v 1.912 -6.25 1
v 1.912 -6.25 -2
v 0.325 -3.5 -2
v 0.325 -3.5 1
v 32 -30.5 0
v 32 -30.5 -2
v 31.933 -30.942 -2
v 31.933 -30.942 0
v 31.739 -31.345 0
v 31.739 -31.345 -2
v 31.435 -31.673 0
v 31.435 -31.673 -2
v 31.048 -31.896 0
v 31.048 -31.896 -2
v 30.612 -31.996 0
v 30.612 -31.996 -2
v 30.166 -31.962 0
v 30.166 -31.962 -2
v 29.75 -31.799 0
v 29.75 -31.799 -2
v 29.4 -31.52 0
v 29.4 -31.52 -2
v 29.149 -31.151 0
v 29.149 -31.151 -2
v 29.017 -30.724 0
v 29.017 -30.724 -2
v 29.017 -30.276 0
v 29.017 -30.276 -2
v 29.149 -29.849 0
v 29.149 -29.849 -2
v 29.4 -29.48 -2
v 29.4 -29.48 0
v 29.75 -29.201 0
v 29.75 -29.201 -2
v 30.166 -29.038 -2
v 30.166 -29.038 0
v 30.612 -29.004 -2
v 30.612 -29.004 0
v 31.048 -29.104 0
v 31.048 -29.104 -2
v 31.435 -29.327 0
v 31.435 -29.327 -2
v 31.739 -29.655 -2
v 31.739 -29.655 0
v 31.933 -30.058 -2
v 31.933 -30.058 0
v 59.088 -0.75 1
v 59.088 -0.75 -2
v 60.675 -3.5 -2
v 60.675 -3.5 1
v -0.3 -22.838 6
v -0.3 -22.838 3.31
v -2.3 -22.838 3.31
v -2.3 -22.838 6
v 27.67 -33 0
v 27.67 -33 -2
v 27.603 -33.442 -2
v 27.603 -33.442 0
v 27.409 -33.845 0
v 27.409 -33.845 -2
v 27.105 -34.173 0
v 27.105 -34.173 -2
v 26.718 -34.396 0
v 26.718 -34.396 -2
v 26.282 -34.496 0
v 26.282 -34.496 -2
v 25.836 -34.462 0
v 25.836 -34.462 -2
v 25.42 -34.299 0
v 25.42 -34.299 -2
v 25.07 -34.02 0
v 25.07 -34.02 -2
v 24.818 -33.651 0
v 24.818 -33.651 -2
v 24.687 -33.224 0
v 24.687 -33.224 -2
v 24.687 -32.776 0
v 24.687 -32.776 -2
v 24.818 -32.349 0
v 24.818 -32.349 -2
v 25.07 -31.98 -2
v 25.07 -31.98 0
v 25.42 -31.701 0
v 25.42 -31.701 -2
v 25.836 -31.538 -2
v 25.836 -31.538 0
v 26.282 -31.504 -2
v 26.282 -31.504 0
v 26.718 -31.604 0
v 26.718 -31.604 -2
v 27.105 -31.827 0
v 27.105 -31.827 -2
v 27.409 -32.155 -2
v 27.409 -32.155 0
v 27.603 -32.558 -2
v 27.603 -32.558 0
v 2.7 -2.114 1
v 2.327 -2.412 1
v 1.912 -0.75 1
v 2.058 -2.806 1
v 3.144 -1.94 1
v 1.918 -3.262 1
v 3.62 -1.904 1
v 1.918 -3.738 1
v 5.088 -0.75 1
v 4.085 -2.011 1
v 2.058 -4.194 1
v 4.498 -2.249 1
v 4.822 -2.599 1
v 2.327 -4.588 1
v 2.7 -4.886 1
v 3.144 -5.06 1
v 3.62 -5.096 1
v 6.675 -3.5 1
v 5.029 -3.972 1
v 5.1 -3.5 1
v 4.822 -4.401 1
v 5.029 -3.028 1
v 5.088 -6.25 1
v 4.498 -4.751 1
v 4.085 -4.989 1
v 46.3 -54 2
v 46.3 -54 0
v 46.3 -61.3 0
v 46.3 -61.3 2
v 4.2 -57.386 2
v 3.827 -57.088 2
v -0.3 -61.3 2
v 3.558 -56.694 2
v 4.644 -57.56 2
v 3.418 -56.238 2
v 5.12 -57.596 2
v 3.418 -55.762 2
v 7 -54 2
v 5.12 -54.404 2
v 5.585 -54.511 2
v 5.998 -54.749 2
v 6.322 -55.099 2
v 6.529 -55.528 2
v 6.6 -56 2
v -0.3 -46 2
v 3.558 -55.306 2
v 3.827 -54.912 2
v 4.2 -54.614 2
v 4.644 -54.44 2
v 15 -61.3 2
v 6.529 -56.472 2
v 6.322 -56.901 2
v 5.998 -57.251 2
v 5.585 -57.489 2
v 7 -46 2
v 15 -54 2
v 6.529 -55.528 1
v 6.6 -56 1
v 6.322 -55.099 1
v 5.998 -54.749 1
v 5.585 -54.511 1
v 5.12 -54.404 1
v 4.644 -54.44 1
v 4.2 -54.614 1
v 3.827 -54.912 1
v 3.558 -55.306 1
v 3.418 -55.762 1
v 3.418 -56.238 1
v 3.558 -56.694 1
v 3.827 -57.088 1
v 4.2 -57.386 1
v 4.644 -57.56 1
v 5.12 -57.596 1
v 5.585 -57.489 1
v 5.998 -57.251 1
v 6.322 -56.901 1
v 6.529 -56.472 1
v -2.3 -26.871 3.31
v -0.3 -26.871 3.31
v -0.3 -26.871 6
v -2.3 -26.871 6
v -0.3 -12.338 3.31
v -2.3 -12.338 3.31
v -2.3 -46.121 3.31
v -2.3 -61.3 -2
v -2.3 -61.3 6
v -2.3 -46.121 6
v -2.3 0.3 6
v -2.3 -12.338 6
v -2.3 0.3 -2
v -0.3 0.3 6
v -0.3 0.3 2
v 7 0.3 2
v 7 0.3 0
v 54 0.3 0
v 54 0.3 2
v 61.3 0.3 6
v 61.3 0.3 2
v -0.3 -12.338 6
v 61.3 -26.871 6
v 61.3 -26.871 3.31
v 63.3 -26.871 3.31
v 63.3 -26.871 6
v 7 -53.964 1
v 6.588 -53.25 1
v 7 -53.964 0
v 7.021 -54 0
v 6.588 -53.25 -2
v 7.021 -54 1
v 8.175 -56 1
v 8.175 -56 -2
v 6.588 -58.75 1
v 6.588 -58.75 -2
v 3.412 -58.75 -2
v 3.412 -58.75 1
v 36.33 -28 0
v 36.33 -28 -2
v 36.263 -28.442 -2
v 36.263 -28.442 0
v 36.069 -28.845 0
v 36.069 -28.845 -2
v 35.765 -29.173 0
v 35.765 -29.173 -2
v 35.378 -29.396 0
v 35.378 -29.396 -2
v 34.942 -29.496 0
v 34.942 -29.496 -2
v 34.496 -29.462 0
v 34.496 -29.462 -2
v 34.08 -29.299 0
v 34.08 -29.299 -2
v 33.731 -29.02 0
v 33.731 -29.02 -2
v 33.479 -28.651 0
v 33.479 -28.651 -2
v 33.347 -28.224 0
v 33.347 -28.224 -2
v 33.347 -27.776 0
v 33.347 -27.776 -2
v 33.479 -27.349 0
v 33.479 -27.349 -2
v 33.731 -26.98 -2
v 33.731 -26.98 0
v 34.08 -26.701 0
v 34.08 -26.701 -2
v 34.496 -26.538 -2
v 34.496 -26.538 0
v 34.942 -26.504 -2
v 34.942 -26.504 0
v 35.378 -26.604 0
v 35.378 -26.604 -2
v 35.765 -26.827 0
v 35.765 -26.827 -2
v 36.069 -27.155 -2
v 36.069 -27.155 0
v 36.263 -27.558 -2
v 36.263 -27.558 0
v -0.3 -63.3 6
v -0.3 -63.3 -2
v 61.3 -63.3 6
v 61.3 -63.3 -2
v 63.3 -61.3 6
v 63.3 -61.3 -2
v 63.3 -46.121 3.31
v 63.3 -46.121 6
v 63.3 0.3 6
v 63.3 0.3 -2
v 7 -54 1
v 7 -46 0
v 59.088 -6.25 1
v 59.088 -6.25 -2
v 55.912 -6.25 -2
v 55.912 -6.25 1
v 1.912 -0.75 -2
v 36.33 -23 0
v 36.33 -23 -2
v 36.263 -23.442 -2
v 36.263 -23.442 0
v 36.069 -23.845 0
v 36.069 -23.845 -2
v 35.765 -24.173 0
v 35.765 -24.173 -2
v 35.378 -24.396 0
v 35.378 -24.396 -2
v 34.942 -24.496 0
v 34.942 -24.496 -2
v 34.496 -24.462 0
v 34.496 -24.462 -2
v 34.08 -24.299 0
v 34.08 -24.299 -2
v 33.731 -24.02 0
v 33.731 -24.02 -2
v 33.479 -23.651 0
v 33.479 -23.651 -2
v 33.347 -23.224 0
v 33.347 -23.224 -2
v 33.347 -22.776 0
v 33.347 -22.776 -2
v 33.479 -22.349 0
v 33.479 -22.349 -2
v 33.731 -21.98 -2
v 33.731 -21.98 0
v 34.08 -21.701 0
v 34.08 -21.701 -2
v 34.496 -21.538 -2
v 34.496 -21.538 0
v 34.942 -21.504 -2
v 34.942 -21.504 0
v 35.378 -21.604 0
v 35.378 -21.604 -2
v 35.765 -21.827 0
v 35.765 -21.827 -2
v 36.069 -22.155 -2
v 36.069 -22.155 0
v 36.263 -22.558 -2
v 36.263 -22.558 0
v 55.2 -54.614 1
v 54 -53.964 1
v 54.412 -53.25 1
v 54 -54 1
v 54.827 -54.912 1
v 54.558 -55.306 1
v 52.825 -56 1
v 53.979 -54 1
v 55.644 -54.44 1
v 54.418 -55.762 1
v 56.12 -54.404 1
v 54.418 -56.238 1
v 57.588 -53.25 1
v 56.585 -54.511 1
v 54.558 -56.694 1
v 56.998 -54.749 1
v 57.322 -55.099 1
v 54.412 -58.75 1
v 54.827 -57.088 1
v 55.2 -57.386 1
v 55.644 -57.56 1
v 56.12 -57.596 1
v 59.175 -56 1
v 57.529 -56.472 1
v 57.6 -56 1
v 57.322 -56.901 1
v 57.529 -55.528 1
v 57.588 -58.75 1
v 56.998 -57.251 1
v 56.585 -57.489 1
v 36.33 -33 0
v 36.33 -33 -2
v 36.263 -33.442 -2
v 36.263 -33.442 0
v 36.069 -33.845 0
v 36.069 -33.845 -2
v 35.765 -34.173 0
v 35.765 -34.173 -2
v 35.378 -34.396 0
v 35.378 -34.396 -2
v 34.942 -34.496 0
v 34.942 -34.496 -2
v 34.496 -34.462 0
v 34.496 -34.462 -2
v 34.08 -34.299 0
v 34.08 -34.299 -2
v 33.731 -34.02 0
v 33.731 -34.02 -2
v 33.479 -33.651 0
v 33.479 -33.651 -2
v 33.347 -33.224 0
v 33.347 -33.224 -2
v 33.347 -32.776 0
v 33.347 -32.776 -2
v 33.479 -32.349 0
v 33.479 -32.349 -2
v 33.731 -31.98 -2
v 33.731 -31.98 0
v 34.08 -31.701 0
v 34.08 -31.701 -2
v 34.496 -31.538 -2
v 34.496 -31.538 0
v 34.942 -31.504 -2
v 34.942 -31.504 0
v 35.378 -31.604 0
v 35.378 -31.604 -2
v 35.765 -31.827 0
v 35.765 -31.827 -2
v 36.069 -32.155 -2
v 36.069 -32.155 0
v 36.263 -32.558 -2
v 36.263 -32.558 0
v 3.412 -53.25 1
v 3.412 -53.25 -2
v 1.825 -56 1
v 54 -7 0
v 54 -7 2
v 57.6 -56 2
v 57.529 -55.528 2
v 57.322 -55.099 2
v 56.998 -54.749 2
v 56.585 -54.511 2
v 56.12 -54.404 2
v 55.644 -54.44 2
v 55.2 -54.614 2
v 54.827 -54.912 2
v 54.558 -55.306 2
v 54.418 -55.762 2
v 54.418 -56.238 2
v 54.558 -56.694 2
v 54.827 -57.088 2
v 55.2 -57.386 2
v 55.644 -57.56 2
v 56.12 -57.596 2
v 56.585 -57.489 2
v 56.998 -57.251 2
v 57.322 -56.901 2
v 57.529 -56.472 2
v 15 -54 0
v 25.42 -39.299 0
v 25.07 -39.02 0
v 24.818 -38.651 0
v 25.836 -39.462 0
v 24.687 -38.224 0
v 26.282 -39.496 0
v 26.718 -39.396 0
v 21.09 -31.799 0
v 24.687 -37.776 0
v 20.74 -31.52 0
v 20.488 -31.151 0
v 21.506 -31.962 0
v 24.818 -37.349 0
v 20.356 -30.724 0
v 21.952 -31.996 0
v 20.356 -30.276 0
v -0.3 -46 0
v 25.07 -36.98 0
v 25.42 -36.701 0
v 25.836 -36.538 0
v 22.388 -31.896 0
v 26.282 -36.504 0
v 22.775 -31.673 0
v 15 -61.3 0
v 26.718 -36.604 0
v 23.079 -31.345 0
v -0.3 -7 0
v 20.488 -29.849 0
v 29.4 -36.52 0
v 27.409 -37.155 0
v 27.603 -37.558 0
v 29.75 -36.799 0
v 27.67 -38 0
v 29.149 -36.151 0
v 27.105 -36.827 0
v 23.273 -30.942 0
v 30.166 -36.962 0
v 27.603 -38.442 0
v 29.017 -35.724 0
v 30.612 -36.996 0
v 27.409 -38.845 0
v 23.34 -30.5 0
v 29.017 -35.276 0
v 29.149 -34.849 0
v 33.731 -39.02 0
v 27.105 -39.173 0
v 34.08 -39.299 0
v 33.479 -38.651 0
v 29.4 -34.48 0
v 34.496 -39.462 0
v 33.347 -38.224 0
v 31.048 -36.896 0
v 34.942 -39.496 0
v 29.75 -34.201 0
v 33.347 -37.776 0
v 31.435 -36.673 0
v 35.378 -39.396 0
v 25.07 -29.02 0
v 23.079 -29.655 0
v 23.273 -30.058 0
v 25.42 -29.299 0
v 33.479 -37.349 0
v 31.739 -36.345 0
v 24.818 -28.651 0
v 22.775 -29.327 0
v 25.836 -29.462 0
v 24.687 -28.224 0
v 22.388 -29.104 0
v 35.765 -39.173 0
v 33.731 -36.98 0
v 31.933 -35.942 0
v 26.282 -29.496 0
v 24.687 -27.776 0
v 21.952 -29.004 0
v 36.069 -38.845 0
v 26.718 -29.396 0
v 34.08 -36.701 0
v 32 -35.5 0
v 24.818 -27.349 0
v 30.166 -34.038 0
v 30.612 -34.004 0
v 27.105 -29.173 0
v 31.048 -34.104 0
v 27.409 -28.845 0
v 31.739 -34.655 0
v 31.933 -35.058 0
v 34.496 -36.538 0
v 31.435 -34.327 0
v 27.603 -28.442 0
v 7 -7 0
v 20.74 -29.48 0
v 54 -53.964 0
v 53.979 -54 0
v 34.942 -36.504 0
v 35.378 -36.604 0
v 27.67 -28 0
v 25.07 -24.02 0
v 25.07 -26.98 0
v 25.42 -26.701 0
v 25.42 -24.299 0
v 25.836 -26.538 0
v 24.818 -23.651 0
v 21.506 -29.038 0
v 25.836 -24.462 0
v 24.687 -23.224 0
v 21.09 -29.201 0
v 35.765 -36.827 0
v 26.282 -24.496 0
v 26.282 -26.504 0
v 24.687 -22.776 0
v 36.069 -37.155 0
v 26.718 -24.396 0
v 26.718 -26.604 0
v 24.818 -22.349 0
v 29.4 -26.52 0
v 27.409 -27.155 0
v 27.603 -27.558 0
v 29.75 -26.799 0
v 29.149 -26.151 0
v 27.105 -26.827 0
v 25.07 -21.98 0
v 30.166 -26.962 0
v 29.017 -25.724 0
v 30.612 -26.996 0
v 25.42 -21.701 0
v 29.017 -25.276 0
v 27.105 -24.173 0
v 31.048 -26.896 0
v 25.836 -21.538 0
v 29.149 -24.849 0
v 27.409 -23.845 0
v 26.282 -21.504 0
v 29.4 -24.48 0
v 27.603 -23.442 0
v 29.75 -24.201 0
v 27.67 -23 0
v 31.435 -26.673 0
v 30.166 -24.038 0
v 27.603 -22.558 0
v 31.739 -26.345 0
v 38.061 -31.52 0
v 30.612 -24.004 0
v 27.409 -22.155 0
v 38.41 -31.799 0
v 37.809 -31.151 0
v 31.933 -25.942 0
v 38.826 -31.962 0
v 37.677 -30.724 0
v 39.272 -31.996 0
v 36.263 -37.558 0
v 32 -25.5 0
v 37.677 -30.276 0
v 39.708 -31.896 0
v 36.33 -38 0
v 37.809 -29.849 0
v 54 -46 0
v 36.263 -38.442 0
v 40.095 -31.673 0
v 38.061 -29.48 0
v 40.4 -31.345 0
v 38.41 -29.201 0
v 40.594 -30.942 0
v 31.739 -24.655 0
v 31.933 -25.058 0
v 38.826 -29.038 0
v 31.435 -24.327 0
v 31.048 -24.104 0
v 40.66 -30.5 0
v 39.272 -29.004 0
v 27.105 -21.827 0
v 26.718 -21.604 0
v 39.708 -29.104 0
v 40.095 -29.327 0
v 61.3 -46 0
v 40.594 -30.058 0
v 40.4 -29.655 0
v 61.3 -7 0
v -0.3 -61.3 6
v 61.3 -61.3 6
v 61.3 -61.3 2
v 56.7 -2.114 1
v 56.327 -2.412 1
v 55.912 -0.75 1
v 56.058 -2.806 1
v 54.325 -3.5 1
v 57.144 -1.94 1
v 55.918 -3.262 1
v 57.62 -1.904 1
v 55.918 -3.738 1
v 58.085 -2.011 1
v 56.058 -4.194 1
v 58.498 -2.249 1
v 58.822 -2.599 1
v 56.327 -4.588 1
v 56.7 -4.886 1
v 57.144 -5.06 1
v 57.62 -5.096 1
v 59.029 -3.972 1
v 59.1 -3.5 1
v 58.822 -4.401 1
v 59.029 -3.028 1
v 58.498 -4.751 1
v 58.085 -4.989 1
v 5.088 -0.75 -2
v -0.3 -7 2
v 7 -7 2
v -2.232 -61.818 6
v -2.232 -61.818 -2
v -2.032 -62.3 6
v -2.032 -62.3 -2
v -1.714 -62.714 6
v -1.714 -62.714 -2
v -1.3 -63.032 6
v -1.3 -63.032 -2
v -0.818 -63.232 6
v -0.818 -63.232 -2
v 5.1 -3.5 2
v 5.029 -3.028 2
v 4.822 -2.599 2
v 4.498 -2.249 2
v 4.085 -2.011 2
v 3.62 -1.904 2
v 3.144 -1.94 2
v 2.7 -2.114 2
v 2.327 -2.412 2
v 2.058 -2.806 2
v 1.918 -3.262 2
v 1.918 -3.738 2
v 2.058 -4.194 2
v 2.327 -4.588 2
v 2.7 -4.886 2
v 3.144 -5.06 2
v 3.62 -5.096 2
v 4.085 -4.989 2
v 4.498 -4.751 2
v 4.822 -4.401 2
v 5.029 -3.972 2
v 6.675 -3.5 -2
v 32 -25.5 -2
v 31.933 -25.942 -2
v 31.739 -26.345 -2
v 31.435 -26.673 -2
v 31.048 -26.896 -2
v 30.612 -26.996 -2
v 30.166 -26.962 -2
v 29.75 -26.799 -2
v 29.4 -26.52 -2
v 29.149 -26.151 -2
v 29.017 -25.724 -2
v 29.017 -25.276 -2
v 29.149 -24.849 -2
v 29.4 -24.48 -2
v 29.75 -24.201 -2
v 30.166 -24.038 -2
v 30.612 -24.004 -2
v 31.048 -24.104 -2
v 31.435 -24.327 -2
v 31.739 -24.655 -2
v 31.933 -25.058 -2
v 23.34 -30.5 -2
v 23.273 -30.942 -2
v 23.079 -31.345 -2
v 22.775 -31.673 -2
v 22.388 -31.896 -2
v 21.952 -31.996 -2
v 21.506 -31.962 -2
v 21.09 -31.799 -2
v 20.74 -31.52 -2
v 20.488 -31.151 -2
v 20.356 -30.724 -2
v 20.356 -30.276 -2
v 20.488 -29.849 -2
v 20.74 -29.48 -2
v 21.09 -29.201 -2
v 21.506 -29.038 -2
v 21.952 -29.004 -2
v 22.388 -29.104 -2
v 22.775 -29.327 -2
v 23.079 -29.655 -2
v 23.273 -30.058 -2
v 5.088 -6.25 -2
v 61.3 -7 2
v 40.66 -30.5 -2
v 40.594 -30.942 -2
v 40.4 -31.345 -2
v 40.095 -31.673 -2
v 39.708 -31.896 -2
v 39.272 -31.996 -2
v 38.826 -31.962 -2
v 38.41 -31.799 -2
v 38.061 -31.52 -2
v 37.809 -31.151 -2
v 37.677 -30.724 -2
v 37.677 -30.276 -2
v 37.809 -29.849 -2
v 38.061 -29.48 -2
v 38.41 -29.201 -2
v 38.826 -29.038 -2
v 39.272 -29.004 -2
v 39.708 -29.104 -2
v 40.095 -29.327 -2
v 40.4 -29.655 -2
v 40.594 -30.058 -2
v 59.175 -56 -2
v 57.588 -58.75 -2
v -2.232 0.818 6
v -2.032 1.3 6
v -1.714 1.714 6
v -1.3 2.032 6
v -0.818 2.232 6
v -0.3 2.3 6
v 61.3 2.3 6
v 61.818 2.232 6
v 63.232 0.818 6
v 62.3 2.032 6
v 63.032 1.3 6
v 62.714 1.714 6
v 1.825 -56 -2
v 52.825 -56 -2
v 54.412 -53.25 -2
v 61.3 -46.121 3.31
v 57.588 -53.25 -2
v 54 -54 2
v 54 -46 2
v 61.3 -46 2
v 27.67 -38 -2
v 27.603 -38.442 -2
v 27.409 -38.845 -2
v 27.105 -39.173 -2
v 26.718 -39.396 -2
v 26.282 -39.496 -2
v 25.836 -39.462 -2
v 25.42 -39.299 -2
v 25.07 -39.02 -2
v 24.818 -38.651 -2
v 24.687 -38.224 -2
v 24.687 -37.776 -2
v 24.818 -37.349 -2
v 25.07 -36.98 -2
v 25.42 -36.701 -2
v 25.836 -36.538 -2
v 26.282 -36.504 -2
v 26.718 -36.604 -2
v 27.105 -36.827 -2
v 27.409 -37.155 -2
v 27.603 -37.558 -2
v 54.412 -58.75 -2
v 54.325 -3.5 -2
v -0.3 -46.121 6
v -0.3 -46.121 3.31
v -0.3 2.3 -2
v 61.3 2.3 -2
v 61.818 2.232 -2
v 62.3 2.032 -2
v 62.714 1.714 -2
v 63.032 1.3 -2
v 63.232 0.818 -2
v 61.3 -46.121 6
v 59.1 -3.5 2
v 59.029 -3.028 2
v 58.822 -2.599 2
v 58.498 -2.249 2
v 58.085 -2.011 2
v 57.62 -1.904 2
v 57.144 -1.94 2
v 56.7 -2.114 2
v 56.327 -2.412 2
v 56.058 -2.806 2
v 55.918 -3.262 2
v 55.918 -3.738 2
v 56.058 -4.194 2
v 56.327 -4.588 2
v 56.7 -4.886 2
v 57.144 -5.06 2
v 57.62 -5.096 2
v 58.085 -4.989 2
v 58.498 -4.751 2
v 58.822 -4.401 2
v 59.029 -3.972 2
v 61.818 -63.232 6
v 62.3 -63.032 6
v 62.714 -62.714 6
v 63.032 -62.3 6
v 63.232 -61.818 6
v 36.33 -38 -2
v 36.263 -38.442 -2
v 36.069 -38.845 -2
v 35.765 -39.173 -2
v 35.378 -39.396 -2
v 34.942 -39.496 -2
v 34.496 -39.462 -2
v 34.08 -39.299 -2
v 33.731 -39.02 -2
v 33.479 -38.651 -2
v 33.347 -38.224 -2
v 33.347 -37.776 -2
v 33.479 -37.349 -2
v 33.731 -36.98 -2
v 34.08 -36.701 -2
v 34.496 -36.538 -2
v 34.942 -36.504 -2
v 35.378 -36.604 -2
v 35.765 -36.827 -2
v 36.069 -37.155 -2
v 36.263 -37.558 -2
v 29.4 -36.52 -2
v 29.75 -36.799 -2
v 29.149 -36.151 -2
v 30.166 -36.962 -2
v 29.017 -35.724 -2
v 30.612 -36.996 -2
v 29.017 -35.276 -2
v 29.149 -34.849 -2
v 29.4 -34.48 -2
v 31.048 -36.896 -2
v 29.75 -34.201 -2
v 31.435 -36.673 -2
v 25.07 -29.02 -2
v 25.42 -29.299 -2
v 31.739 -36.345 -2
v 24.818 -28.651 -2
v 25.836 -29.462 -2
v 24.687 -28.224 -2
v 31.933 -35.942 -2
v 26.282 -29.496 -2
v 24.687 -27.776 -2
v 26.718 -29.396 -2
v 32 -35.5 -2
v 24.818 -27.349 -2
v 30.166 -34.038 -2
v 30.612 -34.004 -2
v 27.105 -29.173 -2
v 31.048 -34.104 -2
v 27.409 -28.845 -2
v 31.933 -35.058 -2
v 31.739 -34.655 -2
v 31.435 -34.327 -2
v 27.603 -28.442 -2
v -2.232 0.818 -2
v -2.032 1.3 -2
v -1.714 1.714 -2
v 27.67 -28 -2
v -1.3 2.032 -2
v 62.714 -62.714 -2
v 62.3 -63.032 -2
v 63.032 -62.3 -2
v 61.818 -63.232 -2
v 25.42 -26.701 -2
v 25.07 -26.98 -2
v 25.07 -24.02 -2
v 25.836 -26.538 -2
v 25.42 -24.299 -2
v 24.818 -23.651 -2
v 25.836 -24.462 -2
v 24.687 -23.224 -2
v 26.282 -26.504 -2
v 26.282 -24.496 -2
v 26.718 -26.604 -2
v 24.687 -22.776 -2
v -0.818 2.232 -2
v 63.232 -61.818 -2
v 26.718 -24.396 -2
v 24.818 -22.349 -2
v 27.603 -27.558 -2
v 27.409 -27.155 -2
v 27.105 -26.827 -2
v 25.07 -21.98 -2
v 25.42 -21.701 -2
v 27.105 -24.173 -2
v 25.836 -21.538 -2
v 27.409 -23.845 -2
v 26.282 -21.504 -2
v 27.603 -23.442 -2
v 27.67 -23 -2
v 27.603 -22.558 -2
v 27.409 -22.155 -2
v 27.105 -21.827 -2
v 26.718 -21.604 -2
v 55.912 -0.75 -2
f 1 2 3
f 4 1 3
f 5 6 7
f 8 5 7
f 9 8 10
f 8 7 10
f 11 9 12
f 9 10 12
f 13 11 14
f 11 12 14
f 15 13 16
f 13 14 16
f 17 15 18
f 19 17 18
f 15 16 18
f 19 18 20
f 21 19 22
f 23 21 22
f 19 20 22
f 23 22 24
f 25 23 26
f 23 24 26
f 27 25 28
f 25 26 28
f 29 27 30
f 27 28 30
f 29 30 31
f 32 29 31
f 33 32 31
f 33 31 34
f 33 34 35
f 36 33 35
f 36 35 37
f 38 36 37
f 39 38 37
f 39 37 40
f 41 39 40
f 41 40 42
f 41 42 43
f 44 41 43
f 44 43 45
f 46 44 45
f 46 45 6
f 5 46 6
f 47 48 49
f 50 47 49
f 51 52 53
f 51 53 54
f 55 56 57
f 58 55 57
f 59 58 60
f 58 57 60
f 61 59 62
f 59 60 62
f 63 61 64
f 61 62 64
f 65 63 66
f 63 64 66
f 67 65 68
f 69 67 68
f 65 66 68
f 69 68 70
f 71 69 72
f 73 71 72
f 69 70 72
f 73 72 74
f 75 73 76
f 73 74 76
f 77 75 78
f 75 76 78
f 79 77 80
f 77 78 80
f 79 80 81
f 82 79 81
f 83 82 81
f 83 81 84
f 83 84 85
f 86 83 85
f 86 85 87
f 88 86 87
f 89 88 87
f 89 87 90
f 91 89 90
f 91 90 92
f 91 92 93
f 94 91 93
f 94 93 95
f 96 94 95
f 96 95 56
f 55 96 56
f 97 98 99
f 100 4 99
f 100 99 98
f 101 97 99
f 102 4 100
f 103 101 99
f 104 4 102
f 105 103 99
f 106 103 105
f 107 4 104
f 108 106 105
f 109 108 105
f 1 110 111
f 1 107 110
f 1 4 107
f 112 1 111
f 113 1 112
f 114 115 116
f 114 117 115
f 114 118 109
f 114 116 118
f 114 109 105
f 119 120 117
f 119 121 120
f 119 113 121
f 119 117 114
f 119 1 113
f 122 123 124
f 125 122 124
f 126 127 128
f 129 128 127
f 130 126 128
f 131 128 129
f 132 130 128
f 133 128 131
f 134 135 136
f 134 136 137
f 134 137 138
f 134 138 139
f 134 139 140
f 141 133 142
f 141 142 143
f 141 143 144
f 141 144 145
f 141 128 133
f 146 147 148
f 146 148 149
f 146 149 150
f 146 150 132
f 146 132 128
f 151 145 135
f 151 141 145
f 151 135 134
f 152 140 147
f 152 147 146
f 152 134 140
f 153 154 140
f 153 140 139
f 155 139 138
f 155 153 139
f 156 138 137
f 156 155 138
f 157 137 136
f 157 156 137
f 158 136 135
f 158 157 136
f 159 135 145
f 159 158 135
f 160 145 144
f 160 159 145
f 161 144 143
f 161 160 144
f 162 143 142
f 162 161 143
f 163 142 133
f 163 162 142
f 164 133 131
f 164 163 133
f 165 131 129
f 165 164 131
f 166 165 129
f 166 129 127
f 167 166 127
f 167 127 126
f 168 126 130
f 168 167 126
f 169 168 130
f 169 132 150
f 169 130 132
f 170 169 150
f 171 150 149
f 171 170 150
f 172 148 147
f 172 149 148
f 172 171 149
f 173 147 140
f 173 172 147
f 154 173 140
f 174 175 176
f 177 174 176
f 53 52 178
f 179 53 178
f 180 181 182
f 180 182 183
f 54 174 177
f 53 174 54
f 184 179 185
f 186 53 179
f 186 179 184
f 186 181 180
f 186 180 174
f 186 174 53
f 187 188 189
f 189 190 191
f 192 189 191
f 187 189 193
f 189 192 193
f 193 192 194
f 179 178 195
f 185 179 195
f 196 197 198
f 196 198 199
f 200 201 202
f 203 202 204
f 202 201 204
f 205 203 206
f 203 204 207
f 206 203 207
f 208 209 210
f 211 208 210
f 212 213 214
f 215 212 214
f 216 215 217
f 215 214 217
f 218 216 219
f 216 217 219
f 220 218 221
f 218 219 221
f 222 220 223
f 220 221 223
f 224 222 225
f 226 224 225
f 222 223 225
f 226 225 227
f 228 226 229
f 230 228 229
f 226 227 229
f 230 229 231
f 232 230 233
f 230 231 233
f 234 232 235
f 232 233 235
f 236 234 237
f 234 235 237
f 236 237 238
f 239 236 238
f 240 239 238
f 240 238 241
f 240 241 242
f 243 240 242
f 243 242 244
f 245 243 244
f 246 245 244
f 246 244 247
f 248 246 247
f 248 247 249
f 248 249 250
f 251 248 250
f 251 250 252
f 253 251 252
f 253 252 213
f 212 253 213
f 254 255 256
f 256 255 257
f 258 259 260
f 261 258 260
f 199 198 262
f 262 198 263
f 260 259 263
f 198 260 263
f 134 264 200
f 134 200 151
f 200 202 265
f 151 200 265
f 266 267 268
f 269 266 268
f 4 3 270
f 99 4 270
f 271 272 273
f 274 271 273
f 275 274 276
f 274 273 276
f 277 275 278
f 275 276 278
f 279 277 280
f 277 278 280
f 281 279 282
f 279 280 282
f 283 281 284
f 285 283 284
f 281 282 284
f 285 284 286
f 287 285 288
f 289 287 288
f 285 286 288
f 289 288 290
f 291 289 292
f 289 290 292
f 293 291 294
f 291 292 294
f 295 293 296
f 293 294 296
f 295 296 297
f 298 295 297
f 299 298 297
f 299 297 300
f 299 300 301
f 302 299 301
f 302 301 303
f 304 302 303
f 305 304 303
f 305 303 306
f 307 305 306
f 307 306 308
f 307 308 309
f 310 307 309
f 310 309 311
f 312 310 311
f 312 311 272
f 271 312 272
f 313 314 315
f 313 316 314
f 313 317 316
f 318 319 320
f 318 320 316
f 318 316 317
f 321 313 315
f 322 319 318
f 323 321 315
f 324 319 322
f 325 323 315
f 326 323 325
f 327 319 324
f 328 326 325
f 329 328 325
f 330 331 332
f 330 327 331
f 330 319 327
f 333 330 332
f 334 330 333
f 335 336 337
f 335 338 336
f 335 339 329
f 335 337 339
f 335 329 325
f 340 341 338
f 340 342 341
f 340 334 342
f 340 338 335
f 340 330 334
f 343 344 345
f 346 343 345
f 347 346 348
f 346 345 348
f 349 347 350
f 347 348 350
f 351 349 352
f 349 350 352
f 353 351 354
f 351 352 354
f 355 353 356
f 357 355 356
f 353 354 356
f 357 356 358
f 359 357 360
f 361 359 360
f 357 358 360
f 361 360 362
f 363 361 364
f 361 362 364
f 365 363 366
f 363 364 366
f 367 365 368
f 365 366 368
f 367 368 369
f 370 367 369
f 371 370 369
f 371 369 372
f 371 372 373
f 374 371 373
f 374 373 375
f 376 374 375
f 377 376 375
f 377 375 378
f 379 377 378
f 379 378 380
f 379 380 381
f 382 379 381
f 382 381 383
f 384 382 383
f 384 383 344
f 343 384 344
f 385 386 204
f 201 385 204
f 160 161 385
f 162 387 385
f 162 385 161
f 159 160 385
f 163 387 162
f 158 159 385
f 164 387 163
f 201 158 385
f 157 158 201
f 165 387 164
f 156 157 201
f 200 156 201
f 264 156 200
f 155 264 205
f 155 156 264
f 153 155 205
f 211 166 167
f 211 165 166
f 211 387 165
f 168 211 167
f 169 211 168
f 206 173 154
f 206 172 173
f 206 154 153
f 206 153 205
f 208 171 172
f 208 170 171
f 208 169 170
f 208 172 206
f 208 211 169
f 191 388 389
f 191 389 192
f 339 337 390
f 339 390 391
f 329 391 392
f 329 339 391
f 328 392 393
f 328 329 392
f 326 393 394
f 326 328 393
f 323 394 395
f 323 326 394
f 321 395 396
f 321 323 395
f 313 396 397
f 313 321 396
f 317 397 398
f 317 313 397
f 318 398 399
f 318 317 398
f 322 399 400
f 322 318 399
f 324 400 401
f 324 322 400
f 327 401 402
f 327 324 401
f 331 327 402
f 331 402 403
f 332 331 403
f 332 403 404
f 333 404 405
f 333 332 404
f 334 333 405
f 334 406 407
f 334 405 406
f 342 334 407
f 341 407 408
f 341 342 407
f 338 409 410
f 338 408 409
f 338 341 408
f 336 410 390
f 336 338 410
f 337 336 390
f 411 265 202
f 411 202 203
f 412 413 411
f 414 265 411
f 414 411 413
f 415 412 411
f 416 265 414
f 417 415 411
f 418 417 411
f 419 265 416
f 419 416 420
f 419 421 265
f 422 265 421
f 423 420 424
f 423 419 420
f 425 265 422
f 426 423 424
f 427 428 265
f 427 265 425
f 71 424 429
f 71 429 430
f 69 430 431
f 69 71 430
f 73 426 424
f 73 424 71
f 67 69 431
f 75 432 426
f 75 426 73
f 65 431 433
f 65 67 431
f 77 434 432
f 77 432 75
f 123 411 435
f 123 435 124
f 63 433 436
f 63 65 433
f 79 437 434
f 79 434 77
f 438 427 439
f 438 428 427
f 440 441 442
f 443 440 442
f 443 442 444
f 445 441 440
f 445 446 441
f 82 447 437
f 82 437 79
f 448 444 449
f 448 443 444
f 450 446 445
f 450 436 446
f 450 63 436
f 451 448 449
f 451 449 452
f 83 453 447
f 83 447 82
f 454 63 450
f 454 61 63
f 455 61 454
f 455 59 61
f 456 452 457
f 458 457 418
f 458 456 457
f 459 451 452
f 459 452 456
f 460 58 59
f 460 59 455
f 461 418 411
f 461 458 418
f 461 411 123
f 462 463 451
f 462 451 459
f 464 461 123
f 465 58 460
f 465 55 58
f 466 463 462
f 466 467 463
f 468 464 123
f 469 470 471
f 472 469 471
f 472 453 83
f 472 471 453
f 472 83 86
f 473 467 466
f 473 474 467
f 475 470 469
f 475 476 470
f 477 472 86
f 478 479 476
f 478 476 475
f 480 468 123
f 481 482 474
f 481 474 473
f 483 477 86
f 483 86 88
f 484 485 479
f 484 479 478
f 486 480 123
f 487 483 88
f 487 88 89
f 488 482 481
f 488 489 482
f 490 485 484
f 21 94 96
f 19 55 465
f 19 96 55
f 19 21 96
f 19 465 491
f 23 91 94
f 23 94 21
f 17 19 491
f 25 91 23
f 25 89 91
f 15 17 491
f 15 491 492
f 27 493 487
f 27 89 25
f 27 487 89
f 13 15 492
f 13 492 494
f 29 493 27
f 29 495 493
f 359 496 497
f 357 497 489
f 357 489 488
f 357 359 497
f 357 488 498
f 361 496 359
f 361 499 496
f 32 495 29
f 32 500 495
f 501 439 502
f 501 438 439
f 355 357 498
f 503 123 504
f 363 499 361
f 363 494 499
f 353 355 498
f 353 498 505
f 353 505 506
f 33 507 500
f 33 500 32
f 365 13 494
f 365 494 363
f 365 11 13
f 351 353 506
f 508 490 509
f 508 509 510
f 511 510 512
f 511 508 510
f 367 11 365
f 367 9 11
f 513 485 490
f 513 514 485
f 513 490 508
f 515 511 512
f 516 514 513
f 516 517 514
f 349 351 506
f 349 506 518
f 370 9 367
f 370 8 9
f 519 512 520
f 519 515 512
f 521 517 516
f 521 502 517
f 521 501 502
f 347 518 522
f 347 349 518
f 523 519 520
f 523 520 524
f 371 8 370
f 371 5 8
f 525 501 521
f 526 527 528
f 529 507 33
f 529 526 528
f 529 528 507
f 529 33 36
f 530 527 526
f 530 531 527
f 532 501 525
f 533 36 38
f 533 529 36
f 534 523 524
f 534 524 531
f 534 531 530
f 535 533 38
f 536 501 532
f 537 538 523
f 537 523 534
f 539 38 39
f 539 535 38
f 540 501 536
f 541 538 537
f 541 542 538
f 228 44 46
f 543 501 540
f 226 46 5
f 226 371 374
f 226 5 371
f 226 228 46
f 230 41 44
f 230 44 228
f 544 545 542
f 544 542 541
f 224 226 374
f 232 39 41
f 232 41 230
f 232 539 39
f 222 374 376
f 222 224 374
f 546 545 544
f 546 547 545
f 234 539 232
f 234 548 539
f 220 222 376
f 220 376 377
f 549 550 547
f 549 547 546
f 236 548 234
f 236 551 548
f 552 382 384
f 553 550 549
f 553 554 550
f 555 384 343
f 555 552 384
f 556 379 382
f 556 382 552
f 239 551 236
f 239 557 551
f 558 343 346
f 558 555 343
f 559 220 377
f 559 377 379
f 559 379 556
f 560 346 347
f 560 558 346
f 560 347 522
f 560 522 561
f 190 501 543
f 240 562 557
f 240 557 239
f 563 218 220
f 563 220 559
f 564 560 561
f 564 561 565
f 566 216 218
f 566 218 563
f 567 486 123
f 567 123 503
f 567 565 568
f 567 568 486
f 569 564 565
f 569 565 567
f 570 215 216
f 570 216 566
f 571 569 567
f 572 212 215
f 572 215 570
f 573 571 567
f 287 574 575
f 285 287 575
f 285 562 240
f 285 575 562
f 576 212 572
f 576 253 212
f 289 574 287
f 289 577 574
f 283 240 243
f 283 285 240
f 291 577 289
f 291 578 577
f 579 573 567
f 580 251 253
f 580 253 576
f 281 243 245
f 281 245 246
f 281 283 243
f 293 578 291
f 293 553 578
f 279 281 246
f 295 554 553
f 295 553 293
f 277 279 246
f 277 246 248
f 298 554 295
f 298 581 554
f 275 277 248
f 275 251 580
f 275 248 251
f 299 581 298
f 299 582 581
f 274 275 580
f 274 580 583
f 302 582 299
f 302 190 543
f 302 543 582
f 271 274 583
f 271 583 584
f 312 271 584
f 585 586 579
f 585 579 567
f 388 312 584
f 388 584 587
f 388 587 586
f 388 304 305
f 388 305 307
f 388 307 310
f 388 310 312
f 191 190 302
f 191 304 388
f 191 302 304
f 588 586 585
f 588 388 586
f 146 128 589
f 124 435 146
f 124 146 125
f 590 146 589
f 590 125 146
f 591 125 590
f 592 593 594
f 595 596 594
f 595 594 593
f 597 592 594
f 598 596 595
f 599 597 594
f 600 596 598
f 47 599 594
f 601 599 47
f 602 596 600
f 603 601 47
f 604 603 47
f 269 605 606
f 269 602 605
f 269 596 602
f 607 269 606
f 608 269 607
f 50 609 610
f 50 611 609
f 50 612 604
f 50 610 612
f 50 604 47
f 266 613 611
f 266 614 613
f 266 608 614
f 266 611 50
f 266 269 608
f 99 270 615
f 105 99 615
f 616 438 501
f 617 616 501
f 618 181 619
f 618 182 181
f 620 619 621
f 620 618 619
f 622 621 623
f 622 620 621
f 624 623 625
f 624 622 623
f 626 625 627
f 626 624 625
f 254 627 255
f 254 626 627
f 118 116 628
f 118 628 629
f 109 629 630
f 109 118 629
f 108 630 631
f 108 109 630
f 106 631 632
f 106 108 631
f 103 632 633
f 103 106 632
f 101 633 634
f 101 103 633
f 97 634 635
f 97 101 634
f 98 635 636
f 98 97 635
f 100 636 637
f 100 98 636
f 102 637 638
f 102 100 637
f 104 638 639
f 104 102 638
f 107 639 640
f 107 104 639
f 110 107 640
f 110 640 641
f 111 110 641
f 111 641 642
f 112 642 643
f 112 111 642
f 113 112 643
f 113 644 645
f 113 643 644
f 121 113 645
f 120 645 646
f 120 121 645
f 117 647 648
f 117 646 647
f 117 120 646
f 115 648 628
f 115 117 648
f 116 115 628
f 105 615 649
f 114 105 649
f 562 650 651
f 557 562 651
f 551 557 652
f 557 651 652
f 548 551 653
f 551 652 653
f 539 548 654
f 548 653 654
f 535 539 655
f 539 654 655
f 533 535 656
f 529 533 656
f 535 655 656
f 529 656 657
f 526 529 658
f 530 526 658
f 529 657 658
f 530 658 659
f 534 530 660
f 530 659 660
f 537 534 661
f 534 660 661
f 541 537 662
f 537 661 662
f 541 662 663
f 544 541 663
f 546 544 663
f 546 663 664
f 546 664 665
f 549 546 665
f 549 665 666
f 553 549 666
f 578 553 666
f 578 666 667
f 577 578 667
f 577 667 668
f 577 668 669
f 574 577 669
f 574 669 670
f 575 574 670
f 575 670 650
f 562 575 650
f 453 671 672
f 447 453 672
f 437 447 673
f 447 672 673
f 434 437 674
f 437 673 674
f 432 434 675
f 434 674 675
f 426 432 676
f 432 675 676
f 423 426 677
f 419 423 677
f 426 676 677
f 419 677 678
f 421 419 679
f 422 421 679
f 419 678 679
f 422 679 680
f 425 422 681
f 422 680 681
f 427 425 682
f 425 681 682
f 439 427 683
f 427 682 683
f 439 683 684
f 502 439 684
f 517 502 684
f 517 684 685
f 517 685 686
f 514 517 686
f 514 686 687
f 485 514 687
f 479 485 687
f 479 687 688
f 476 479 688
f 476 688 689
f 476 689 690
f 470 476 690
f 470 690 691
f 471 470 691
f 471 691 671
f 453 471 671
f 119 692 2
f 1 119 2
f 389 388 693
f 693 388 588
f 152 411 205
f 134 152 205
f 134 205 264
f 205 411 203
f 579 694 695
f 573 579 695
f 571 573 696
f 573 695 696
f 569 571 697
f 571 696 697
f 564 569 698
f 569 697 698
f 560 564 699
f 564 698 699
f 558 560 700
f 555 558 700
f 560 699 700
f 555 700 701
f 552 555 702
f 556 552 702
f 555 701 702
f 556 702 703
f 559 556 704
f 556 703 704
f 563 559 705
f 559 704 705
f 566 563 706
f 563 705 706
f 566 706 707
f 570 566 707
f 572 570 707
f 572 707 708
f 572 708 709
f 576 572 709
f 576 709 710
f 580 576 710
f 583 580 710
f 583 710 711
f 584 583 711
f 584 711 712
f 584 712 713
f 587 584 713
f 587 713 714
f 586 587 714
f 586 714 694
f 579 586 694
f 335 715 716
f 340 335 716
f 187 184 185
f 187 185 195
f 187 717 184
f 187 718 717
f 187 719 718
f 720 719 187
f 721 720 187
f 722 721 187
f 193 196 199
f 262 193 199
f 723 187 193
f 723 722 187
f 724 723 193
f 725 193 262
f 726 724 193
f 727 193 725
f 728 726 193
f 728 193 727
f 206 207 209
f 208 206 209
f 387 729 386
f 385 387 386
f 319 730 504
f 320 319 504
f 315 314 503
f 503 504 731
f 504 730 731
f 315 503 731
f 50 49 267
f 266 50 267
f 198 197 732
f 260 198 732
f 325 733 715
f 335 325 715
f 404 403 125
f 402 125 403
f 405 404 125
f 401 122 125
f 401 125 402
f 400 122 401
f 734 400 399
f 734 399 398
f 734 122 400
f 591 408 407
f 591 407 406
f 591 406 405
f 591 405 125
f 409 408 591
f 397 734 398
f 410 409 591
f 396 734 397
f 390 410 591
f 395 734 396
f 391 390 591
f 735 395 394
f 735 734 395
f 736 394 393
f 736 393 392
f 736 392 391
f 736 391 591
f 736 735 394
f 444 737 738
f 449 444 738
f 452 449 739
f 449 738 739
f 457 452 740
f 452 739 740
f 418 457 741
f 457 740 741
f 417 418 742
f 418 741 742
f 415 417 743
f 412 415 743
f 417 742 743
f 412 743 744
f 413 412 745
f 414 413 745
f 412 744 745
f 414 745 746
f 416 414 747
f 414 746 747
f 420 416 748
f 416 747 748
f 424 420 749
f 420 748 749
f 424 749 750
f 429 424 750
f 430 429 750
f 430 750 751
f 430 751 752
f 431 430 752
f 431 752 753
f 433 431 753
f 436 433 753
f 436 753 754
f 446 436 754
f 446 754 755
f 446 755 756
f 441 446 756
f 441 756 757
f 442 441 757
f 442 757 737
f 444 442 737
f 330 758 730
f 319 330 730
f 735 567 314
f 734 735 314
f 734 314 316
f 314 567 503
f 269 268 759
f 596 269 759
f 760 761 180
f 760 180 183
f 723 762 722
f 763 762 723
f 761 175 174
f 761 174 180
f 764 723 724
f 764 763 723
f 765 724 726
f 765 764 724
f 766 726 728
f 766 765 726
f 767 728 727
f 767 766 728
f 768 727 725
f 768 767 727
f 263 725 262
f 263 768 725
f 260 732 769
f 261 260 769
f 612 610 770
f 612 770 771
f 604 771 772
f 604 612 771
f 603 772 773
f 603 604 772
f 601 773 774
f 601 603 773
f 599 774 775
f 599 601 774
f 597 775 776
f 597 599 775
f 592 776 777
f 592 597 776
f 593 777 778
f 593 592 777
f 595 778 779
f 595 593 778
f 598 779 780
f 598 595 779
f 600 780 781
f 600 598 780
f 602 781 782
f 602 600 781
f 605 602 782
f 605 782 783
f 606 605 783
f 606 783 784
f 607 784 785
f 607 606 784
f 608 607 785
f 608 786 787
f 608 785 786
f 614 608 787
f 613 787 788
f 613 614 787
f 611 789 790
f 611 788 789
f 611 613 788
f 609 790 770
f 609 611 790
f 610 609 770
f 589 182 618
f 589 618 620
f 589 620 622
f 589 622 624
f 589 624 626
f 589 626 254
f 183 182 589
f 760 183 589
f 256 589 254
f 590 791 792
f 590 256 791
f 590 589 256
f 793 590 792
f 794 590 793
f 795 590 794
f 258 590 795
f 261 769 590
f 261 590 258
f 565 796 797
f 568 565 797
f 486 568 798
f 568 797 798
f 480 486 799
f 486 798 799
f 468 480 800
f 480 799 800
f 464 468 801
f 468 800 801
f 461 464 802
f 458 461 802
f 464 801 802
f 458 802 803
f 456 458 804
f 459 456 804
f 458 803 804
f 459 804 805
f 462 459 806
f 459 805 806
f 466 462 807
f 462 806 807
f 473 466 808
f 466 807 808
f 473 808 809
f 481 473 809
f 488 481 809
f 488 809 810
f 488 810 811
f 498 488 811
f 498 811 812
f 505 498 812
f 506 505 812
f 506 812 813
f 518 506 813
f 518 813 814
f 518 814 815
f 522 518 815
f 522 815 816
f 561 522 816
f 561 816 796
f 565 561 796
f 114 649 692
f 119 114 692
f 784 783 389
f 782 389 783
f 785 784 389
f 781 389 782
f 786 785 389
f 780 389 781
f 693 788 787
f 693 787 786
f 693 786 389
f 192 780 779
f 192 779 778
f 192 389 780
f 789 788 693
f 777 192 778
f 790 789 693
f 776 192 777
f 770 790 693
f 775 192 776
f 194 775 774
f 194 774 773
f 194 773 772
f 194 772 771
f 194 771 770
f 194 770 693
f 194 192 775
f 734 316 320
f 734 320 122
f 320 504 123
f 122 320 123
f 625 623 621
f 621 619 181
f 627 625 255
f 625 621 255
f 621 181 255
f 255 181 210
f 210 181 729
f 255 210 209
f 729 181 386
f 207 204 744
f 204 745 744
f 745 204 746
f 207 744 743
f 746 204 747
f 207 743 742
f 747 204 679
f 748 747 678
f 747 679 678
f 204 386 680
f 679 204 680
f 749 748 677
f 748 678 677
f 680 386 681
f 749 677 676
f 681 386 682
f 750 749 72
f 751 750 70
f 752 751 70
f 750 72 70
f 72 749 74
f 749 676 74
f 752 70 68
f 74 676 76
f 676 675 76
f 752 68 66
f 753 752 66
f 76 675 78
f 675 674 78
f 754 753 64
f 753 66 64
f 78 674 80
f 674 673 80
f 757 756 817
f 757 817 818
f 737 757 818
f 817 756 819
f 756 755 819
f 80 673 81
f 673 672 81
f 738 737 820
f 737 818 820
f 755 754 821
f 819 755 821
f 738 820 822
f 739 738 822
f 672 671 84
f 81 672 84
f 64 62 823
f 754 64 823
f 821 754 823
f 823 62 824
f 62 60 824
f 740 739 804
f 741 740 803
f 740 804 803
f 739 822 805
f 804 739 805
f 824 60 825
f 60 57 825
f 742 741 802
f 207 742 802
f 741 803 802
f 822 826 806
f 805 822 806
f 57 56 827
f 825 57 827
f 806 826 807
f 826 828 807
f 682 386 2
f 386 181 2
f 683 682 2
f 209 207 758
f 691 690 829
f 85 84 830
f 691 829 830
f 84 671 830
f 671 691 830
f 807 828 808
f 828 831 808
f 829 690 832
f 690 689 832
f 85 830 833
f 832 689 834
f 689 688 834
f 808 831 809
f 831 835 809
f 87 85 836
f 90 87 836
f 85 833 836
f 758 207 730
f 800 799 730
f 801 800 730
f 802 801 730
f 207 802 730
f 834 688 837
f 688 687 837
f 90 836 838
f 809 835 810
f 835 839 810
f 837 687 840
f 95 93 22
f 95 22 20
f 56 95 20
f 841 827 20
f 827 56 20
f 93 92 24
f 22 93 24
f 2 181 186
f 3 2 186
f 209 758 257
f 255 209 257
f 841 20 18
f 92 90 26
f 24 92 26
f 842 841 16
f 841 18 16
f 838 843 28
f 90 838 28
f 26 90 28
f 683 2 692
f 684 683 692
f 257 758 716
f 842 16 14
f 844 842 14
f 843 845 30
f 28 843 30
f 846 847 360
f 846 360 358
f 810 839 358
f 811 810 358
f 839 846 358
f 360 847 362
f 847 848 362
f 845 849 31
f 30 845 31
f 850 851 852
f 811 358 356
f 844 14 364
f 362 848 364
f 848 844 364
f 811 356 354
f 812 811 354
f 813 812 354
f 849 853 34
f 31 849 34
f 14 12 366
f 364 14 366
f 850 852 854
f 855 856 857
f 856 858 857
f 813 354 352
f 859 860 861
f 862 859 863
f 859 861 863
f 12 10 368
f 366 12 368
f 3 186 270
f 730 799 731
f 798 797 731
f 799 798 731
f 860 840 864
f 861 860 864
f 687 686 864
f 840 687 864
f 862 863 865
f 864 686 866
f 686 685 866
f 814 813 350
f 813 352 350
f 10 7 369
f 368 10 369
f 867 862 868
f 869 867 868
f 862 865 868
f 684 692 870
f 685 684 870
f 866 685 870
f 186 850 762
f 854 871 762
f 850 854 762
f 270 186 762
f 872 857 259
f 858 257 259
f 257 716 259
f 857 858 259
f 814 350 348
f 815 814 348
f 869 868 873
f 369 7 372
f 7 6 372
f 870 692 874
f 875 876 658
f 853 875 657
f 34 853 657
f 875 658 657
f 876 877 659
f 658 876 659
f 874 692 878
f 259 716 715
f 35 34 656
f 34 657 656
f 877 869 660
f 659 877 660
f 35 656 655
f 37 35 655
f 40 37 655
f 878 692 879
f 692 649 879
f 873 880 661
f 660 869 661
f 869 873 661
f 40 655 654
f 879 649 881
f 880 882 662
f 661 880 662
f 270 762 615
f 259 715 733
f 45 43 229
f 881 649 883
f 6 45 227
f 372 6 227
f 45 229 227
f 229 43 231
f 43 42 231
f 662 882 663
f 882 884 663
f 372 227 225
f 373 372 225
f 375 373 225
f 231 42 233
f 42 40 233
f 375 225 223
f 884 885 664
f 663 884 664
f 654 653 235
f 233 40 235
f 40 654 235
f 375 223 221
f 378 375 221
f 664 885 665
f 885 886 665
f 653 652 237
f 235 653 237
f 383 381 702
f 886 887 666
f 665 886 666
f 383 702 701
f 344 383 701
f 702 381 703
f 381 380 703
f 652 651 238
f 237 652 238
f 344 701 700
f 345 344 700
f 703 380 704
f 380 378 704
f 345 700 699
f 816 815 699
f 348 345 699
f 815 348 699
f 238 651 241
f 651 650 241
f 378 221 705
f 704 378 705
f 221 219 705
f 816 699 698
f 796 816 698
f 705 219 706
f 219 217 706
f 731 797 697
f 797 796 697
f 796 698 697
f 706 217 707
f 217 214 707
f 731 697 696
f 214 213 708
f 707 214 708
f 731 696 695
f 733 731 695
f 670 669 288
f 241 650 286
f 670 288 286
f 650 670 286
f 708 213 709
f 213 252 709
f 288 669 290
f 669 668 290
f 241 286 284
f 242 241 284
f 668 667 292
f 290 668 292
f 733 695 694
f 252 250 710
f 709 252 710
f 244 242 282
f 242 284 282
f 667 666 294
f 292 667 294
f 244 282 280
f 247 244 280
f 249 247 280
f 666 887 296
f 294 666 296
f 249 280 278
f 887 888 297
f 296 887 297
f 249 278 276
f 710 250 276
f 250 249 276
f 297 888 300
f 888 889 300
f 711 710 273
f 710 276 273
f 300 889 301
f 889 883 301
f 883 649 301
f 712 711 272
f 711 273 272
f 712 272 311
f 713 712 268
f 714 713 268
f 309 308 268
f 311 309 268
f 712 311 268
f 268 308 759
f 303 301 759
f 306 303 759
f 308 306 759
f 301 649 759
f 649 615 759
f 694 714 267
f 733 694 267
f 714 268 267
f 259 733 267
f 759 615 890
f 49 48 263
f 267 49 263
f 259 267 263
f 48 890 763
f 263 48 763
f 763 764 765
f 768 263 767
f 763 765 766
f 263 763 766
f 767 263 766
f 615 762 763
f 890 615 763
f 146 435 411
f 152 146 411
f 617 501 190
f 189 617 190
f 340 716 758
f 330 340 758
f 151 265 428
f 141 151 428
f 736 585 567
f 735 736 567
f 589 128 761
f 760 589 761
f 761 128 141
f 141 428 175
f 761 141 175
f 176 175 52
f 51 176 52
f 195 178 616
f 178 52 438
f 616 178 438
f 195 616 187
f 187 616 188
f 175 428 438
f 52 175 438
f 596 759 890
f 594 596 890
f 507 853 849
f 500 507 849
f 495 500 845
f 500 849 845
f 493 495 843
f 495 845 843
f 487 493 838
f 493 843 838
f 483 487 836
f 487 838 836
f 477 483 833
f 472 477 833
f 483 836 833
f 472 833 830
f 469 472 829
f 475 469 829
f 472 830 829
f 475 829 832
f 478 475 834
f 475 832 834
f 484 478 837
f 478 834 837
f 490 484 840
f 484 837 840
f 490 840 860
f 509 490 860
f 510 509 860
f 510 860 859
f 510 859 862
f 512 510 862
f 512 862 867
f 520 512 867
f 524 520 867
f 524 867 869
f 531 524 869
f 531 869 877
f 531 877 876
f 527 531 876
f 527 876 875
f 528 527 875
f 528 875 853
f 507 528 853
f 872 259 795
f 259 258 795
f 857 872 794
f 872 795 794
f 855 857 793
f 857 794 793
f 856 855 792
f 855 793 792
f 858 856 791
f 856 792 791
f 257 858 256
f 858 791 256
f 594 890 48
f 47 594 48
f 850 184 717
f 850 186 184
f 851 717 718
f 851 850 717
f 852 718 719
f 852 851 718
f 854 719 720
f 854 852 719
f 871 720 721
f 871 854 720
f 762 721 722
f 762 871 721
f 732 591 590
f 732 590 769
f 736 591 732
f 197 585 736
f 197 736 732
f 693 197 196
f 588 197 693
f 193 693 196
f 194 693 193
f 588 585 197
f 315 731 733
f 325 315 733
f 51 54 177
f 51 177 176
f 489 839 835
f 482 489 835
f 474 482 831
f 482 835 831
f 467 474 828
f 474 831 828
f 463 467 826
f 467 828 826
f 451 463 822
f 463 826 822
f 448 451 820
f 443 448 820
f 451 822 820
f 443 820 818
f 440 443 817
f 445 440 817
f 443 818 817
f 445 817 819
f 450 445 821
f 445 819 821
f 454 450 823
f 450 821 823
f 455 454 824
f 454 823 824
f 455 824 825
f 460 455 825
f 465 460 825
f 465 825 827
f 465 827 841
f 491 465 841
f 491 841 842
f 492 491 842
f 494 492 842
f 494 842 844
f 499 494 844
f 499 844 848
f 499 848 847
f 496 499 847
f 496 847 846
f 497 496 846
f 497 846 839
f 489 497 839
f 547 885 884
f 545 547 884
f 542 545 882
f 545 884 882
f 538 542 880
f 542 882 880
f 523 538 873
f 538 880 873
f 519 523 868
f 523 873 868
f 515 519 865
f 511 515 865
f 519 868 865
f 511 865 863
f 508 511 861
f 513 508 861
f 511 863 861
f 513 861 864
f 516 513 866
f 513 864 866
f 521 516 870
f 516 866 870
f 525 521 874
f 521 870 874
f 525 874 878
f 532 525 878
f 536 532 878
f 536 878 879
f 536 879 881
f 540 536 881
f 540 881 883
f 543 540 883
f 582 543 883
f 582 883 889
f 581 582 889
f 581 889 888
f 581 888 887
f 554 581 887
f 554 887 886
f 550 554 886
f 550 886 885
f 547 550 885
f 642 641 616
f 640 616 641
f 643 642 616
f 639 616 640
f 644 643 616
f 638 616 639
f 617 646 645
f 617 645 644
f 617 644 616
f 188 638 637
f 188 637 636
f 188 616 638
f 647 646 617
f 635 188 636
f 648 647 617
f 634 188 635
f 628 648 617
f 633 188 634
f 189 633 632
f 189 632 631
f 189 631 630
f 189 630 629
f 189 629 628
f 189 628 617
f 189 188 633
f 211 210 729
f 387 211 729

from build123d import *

# Parameters (mm, degrees)
F0_W          = 65.6000001021
F0_H          = 65.6000001021
F0_W_2        = 61.6
F0_H_2        = 61.6
F0_R          = 1.6
F1_DEPTH      = 2
F2_DEPTH      = 6
F3_W          = 7.3
F3_H          = 7.3
F4_DEPTH      = 2
F5_DEPTH      = 6.001
F6_W          = 19.25
F6_H          = 2.69
F7_DEPTH      = 2.001000051
F7_DEPTH_BACK = 63.601000051
F8_W          = 10.5
F8_H          = 2.69
F9_DEPTH      = 2.001000051
F11_DEPTH     = 3
F12_R         = 1.5
F13_DEPTH     = 8.001
F14_R         = 2


with BuildPart() as f1:
    # F0 (on Top) → F1 (new body)
    with BuildSketch(Plane.XY):
        with Locations((30.5, -30.5)):
            Rectangle(F0_W, F0_H)
        with Locations((30.5, -30.5)):
            Rectangle(F0_W_2, F0_H_2, mode=Mode.SUBTRACT)
        with Locations((30.5, -30.5)):
            Rectangle(F0_W_2, F0_H_2)
        with Locations((5, -56)):
            Circle(F0_R, mode=Mode.SUBTRACT)
        with Locations((56, -56)):
            Circle(F0_R, mode=Mode.SUBTRACT)
        with Locations((3.5, -3.5)):
            Circle(F0_R, mode=Mode.SUBTRACT)
        with Locations((57.5, -3.5)):
            Circle(F0_R, mode=Mode.SUBTRACT)
    extrude(amount=-F1_DEPTH)

    # F0 (on Top) → F2 (join)
    with BuildSketch(Plane.XY):
        with Locations((30.5, -30.5)):
            Rectangle(F0_W, F0_H)
        with Locations((30.5, -30.5)):
            Rectangle(F0_W_2, F0_H_2, mode=Mode.SUBTRACT)
    extrude(amount=F2_DEPTH)

    # F3 (on face) → F4 (join)
    with BuildSketch(Plane.XY):
        with Locations((57.65, -3.35)):
            Rectangle(F3_W, F3_H)
        with Locations((3.35, -3.35)):
            Rectangle(F3_W, F3_H)
        Polygon((7, -46), (-0.3, -46), (-0.3, -61.3), (15, -61.3), (15, -54), (7, -54), align=None)
        Polygon((61.3, -61.3), (61.3, -46), (54, -46), (54, -54), (46.3, -54), (46.3, -61.3), align=None)
    extrude(amount=F4_DEPTH)

    # F0 (on Top) → F5 (cut, through all)
    with BuildSketch(Plane.XY):
        with Locations((3.5, -3.5)):
            Circle(F0_R)
        with Locations((57.5, -3.5)):
            Circle(F0_R)
        with Locations((5, -56)):
            Circle(F0_R)
        with Locations((56, -56)):
            Circle(F0_R)
    extrude(amount=F5_DEPTH, mode=Mode.SUBTRACT)

    # F6 (on face) → F7 (cut, two sides)
    with BuildSketch(Plane(origin=(61.3, 0, 0), x_dir=(0, -1, 0), z_dir=(-1, 0, 0))) as f7_sk:
        with Locations((36.496, 4.655)):
            Rectangle(F6_W, F6_H)
    extrude(amount=-F7_DEPTH, mode=Mode.SUBTRACT)
    extrude(f7_sk.sketch, amount=F7_DEPTH_BACK, mode=Mode.SUBTRACT)

    # F8 (on face) → F9 (cut, through all)
    with BuildSketch(Plane.YZ.offset(-0.3)):
        with Locations((-17.588, 4.655)):
            Rectangle(F8_W, F8_H)
    extrude(amount=-F9_DEPTH, mode=Mode.SUBTRACT)

    # F10 (on face) → F11 (cut)
    with BuildSketch(Plane(origin=(0, 0, -2), x_dir=(1, 0, 0), z_dir=(0, 0, -1))):
        Polygon((1.9122867597, 6.25), (0.3245735195, 3.5), (1.9122867597, 0.75), (5.0877132403, 0.75), (6.6754264805, 3.5), (5.0877132403, 6.25), align=None)
        Polygon((55.9122867597, 0.75), (59.0877132403, 0.75), (60.6754264805, 3.5), (59.0877132403, 6.25), (55.9122867597, 6.25), (54.3245735195, 3.5), align=None)
        Polygon((6.5877132403, 53.25), (8.1754264805, 56), (6.5877132403, 58.75), (3.4122867597, 58.75), (1.8245735195, 56), (3.4122867597, 53.25), align=None)
        Polygon((54.4122867597, 53.25), (57.5877132403, 53.25), (59.1754264805, 56), (57.5877132403, 58.75), (54.4122867597, 58.75), (52.8245735195, 56), align=None)
    extrude(amount=-F11_DEPTH, mode=Mode.SUBTRACT)

    # F12 (on face) → F13 (cut, through all)
    with BuildSketch(Plane(origin=(0, 0, -2), x_dir=(1, 0, 0), z_dir=(0, 0, -1))):
        with Locations((30.5, 30.5)):
            Circle(F12_R)
        with Locations((30.5, 35.5)):
            Circle(F12_R)
        with Locations((26.1698729811, 33)):
            Circle(F12_R)
        with Locations((26.1698729811, 28)):
            Circle(F12_R)
        with Locations((30.5, 25.5)):
            Circle(F12_R)
        with Locations((34.8301270189, 28)):
            Circle(F12_R)
        with Locations((34.8301270189, 33)):
            Circle(F12_R)
        with Locations((26.1698729811, 38)):
            Circle(F12_R)
        with Locations((21.8397459622, 30.5)):
            Circle(F12_R)
        with Locations((26.1698729811, 23)):
            Circle(F12_R)
        with Locations((34.8301270189, 23)):
            Circle(F12_R)
        with Locations((39.1602540378, 30.5)):
            Circle(F12_R)
        with Locations((34.8301270189, 38)):
            Circle(F12_R)
    extrude(amount=-F13_DEPTH, mode=Mode.SUBTRACT)

    # F14
    f14_edges = [f1.edges().sort_by_distance(p)[0] for p in [
        (-2.3, -63.3, 2),
        (-2.3, 2.3, 2),
        (63.3, 2.3, 2),
        (63.3, -63.3, 2),
    ]]
    fillet(f14_edges, radius=F14_R)


solid = f1.part
